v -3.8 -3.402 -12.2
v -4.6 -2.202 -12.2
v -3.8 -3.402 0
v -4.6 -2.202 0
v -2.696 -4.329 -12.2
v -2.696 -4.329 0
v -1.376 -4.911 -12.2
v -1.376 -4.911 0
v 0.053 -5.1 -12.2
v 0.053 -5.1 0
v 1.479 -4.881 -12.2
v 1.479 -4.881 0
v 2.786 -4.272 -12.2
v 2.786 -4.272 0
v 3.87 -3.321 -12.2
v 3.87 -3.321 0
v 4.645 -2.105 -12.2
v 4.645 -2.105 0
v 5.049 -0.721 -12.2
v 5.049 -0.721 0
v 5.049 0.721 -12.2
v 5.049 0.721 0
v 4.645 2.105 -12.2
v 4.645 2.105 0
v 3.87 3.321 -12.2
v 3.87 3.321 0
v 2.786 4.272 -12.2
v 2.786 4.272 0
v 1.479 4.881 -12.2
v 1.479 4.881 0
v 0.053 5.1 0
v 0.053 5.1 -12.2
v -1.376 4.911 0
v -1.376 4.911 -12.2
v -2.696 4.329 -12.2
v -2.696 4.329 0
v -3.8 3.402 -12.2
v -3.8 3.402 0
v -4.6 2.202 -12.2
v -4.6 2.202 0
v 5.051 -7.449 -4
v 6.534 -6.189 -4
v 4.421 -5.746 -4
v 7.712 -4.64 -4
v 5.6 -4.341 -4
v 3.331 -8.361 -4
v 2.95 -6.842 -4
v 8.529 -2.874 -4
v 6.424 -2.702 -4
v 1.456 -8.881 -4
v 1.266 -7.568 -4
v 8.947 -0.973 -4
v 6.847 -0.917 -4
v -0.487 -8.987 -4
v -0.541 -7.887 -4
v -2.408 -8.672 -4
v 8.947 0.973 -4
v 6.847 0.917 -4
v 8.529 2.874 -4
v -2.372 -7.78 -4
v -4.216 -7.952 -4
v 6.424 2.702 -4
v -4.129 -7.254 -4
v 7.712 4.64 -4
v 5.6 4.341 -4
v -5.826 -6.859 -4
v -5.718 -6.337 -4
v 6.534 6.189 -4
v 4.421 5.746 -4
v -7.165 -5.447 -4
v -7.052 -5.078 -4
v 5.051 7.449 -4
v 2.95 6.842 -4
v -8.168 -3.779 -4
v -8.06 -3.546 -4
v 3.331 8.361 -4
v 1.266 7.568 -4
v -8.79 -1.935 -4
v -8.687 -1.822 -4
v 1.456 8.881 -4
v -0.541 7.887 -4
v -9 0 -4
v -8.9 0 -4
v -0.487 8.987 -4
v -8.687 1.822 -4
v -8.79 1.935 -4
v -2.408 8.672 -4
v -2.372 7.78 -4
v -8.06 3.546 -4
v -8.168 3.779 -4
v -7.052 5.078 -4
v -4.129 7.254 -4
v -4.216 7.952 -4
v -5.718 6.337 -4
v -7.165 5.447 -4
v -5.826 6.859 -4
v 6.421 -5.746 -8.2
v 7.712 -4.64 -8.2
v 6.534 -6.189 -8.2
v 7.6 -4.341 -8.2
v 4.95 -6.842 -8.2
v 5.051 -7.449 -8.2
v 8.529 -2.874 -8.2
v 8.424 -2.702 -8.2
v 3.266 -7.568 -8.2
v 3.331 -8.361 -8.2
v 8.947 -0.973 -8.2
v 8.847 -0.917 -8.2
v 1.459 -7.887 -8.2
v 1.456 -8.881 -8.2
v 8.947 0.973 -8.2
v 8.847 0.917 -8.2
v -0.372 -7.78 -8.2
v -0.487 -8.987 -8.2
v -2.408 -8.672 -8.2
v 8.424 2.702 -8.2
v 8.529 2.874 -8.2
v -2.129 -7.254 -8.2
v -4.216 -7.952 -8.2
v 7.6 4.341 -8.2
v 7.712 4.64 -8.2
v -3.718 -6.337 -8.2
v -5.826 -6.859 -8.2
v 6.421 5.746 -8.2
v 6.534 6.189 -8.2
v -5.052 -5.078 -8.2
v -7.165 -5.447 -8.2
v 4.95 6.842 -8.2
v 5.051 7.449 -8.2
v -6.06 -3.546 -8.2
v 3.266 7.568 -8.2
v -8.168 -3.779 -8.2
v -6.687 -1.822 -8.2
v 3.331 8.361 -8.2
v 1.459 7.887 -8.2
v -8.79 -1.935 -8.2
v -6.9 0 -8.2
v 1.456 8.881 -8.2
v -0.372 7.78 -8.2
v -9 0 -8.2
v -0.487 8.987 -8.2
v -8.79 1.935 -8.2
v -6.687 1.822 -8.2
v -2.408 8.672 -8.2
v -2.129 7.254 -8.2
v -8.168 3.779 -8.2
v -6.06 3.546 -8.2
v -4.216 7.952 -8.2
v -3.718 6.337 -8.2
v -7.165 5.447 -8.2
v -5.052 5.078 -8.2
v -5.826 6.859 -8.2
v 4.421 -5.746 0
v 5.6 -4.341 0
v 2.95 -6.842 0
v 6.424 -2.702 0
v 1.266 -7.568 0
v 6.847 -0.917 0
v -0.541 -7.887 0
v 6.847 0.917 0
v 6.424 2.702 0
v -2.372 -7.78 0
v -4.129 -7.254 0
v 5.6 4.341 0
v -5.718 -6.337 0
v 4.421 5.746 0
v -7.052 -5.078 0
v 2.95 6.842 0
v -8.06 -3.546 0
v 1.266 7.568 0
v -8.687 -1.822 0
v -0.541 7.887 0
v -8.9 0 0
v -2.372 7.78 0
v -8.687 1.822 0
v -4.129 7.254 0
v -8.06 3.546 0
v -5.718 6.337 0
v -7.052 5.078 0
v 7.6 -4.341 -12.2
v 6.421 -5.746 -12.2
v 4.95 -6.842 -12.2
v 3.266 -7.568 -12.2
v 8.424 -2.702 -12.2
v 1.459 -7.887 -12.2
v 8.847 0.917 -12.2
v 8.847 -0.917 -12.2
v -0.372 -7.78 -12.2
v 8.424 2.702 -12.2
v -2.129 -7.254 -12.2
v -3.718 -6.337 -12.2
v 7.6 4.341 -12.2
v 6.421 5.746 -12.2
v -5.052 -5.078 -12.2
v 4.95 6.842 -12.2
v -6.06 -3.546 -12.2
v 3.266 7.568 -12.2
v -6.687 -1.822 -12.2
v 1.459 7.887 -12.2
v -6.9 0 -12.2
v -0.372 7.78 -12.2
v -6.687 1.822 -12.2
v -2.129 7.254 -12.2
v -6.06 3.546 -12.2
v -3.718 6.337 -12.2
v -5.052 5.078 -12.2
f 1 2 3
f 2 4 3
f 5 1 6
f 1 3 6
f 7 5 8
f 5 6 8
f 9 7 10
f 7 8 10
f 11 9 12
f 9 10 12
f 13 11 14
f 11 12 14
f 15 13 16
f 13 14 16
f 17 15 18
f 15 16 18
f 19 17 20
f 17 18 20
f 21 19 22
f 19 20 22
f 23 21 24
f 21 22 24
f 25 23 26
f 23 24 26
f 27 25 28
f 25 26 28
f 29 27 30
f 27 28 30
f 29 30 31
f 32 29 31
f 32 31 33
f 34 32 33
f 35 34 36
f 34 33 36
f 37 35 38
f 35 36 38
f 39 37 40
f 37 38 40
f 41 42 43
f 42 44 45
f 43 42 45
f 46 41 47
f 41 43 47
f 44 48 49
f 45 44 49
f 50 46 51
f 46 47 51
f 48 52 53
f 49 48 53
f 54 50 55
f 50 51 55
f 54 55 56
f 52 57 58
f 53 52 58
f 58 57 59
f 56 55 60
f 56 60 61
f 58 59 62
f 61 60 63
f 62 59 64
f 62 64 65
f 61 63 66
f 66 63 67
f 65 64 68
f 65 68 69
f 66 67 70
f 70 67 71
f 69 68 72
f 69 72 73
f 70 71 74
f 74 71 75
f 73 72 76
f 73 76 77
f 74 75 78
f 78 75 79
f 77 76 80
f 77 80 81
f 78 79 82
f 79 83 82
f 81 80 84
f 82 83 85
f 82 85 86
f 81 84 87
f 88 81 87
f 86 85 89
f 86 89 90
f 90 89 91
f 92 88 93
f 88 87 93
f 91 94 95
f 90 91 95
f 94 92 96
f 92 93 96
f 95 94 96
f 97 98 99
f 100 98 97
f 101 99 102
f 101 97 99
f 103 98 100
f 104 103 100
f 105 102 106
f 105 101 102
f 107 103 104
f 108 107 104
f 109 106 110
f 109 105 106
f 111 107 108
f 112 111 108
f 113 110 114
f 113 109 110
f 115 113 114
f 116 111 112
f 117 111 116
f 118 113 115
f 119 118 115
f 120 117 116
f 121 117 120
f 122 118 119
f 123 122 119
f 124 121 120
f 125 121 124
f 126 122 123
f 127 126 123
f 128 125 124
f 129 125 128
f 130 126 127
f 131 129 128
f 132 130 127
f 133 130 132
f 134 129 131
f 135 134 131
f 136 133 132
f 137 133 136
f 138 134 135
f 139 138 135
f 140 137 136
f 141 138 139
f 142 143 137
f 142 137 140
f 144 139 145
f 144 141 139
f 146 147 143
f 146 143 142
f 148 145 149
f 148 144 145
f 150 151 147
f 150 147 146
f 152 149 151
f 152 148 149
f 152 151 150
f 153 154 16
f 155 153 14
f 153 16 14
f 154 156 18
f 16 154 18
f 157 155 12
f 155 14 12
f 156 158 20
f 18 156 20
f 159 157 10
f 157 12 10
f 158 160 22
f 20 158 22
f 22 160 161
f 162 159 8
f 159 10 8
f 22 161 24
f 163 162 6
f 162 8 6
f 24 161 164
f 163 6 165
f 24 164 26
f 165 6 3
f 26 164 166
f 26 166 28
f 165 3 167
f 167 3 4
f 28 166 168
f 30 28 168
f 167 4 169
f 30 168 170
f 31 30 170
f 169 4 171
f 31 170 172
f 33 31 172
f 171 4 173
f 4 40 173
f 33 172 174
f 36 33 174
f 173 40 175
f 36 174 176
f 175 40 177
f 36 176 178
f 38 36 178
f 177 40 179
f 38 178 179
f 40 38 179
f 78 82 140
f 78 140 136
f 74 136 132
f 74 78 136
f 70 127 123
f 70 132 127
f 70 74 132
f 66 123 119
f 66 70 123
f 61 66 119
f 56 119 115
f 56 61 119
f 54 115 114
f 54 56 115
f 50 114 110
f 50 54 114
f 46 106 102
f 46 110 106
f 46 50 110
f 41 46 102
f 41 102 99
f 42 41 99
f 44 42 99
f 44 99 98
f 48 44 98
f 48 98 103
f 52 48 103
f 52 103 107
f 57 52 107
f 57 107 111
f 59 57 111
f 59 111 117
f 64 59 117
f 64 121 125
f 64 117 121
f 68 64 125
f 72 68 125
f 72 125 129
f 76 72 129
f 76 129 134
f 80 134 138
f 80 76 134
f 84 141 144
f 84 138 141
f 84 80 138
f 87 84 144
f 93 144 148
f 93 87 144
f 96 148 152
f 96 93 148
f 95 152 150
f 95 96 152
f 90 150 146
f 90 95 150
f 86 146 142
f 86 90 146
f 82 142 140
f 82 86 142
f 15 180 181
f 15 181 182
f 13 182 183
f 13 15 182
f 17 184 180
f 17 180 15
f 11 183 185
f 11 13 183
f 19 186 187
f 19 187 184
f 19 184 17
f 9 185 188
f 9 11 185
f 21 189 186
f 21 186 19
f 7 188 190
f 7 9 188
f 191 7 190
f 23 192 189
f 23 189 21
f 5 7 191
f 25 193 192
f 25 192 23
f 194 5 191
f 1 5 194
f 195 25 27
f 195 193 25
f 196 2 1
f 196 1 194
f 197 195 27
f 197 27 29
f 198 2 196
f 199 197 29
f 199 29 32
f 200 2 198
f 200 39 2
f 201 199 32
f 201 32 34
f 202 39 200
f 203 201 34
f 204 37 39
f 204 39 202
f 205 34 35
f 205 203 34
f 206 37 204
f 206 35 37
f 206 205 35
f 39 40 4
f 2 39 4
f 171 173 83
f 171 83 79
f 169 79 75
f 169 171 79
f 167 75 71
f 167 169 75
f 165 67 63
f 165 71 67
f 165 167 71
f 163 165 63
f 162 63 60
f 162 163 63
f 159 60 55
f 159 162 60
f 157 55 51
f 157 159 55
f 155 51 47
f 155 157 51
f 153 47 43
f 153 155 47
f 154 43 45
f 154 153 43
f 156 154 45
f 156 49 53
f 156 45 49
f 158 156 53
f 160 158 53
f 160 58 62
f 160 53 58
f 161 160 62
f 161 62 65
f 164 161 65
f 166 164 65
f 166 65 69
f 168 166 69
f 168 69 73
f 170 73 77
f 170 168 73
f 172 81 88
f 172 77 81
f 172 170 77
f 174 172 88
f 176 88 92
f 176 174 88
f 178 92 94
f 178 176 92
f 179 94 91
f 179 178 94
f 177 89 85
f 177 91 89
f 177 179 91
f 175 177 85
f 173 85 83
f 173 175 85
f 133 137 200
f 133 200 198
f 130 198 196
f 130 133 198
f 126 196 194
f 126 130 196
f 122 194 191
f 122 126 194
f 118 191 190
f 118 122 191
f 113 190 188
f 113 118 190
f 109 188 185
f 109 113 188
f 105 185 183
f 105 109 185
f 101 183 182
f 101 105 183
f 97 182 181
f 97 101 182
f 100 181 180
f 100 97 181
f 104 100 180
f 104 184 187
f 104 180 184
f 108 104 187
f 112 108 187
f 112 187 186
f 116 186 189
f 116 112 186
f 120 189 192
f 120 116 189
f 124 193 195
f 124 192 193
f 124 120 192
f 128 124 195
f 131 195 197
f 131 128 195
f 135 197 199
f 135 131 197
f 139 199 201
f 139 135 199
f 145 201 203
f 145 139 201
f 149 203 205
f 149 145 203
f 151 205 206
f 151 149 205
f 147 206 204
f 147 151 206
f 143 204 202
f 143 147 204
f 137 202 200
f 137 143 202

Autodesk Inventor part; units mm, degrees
ref_plane "YZ Plane" through (0, 0, 0) normal (1, 0, 0) x (0, 1, 0)
ref_plane "XZ Plane" through (0, 0, 0) normal (0, 1, 0) x (-1, 0, 0)
ref_plane "XY Plane" through (0, 0, 0) normal (0, 0, 1) x (1, 0, 0)
sketch "Sketch1" plane through (0, 0, 0) normal (0, 0, 1) x (1, 0, 0)
  arc A0 (-4.5, -2.1795) -> (-4.5, 2.1795) centre (0, 0) ccw construction
  line L0 (-4.5, 2.1795) -> (-4.5, -2.1795) construction
  arc A1 (-4.5, 2.1795) -> (-4.5, -2.1795) centre (0, 0) ccw construction
  arc A2 (-4.6, -2.2023) -> (-4.6, 2.2023) centre (0, 0) ccw
  line L1 (-4.6, -2.2023) -> (-4.6, 2.2023)
  circle A3 centre (0, 0) radius 8
  dimension "d0" = 10
  dimension "d1" = 4.359
  dimension "d2" = 0.1
  dimension "d3" = 16
extrude "Extrusion1" add sketch "Sketch1" along normal blind 4
sketch "Sketch2" plane through (0, 0, 0) normal (0, 0, -1) x (-1, 0, 0)
  circle A0 centre (1, 0) radius 7.9
  arc A1 (4.6, 2.2023) -> (4.6, -2.2023) centre (0, 0) ccw projected
  line L0 (4.6, -2.2023) -> (4.6, 2.2023) projected
  dimension "d6" = 15.8
  dimension "d7" = 1
extrude "Extrusion2" add sketch "Sketch2" along normal blind 4
sketch "Sketch5" plane through (0, 0, 4) normal (0, 0, 1) x (1, 0, 0)
  circle A0 centre (0, 0) radius 8 projected
extrude "Extrusion5" cut sketch "Sketch5" against normal up to surface (4 mm away)
sketch "Sketch6" plane through (-1, 0, -4) normal (0, 0, -1) x (-1, 0, 0)
  circle A0 centre (-1, 0) radius 9
  arc A1 (3.6, 2.2023) -> (3.6, -2.2023) centre (-1, 0) ccw projected
  line L0 (3.6, 2.2023) -> (3.6, -2.2023) projected
  dimension "d19" = 18
extrude "Extrusion6" add sketch "Sketch6" along normal blind 4.2
sketch "Sketch7" plane through (0, 0, -8.2) normal (0, 0, -1) x (-1, 0, 0)
  circle A0 centre (-1, 0) radius 7.9
  arc A1 (4.6, 2.2023) -> (4.6, -2.2023) centre (0, 0) ccw projected
  line L0 (4.6, 2.2023) -> (4.6, -2.2023) projected
  dimension "d22" = 15.8
  dimension "d23" = 1
extrude "Extrusion7" add sketch "Sketch7" along normal blind 4
properties part number "EccentricBearingShaft"
